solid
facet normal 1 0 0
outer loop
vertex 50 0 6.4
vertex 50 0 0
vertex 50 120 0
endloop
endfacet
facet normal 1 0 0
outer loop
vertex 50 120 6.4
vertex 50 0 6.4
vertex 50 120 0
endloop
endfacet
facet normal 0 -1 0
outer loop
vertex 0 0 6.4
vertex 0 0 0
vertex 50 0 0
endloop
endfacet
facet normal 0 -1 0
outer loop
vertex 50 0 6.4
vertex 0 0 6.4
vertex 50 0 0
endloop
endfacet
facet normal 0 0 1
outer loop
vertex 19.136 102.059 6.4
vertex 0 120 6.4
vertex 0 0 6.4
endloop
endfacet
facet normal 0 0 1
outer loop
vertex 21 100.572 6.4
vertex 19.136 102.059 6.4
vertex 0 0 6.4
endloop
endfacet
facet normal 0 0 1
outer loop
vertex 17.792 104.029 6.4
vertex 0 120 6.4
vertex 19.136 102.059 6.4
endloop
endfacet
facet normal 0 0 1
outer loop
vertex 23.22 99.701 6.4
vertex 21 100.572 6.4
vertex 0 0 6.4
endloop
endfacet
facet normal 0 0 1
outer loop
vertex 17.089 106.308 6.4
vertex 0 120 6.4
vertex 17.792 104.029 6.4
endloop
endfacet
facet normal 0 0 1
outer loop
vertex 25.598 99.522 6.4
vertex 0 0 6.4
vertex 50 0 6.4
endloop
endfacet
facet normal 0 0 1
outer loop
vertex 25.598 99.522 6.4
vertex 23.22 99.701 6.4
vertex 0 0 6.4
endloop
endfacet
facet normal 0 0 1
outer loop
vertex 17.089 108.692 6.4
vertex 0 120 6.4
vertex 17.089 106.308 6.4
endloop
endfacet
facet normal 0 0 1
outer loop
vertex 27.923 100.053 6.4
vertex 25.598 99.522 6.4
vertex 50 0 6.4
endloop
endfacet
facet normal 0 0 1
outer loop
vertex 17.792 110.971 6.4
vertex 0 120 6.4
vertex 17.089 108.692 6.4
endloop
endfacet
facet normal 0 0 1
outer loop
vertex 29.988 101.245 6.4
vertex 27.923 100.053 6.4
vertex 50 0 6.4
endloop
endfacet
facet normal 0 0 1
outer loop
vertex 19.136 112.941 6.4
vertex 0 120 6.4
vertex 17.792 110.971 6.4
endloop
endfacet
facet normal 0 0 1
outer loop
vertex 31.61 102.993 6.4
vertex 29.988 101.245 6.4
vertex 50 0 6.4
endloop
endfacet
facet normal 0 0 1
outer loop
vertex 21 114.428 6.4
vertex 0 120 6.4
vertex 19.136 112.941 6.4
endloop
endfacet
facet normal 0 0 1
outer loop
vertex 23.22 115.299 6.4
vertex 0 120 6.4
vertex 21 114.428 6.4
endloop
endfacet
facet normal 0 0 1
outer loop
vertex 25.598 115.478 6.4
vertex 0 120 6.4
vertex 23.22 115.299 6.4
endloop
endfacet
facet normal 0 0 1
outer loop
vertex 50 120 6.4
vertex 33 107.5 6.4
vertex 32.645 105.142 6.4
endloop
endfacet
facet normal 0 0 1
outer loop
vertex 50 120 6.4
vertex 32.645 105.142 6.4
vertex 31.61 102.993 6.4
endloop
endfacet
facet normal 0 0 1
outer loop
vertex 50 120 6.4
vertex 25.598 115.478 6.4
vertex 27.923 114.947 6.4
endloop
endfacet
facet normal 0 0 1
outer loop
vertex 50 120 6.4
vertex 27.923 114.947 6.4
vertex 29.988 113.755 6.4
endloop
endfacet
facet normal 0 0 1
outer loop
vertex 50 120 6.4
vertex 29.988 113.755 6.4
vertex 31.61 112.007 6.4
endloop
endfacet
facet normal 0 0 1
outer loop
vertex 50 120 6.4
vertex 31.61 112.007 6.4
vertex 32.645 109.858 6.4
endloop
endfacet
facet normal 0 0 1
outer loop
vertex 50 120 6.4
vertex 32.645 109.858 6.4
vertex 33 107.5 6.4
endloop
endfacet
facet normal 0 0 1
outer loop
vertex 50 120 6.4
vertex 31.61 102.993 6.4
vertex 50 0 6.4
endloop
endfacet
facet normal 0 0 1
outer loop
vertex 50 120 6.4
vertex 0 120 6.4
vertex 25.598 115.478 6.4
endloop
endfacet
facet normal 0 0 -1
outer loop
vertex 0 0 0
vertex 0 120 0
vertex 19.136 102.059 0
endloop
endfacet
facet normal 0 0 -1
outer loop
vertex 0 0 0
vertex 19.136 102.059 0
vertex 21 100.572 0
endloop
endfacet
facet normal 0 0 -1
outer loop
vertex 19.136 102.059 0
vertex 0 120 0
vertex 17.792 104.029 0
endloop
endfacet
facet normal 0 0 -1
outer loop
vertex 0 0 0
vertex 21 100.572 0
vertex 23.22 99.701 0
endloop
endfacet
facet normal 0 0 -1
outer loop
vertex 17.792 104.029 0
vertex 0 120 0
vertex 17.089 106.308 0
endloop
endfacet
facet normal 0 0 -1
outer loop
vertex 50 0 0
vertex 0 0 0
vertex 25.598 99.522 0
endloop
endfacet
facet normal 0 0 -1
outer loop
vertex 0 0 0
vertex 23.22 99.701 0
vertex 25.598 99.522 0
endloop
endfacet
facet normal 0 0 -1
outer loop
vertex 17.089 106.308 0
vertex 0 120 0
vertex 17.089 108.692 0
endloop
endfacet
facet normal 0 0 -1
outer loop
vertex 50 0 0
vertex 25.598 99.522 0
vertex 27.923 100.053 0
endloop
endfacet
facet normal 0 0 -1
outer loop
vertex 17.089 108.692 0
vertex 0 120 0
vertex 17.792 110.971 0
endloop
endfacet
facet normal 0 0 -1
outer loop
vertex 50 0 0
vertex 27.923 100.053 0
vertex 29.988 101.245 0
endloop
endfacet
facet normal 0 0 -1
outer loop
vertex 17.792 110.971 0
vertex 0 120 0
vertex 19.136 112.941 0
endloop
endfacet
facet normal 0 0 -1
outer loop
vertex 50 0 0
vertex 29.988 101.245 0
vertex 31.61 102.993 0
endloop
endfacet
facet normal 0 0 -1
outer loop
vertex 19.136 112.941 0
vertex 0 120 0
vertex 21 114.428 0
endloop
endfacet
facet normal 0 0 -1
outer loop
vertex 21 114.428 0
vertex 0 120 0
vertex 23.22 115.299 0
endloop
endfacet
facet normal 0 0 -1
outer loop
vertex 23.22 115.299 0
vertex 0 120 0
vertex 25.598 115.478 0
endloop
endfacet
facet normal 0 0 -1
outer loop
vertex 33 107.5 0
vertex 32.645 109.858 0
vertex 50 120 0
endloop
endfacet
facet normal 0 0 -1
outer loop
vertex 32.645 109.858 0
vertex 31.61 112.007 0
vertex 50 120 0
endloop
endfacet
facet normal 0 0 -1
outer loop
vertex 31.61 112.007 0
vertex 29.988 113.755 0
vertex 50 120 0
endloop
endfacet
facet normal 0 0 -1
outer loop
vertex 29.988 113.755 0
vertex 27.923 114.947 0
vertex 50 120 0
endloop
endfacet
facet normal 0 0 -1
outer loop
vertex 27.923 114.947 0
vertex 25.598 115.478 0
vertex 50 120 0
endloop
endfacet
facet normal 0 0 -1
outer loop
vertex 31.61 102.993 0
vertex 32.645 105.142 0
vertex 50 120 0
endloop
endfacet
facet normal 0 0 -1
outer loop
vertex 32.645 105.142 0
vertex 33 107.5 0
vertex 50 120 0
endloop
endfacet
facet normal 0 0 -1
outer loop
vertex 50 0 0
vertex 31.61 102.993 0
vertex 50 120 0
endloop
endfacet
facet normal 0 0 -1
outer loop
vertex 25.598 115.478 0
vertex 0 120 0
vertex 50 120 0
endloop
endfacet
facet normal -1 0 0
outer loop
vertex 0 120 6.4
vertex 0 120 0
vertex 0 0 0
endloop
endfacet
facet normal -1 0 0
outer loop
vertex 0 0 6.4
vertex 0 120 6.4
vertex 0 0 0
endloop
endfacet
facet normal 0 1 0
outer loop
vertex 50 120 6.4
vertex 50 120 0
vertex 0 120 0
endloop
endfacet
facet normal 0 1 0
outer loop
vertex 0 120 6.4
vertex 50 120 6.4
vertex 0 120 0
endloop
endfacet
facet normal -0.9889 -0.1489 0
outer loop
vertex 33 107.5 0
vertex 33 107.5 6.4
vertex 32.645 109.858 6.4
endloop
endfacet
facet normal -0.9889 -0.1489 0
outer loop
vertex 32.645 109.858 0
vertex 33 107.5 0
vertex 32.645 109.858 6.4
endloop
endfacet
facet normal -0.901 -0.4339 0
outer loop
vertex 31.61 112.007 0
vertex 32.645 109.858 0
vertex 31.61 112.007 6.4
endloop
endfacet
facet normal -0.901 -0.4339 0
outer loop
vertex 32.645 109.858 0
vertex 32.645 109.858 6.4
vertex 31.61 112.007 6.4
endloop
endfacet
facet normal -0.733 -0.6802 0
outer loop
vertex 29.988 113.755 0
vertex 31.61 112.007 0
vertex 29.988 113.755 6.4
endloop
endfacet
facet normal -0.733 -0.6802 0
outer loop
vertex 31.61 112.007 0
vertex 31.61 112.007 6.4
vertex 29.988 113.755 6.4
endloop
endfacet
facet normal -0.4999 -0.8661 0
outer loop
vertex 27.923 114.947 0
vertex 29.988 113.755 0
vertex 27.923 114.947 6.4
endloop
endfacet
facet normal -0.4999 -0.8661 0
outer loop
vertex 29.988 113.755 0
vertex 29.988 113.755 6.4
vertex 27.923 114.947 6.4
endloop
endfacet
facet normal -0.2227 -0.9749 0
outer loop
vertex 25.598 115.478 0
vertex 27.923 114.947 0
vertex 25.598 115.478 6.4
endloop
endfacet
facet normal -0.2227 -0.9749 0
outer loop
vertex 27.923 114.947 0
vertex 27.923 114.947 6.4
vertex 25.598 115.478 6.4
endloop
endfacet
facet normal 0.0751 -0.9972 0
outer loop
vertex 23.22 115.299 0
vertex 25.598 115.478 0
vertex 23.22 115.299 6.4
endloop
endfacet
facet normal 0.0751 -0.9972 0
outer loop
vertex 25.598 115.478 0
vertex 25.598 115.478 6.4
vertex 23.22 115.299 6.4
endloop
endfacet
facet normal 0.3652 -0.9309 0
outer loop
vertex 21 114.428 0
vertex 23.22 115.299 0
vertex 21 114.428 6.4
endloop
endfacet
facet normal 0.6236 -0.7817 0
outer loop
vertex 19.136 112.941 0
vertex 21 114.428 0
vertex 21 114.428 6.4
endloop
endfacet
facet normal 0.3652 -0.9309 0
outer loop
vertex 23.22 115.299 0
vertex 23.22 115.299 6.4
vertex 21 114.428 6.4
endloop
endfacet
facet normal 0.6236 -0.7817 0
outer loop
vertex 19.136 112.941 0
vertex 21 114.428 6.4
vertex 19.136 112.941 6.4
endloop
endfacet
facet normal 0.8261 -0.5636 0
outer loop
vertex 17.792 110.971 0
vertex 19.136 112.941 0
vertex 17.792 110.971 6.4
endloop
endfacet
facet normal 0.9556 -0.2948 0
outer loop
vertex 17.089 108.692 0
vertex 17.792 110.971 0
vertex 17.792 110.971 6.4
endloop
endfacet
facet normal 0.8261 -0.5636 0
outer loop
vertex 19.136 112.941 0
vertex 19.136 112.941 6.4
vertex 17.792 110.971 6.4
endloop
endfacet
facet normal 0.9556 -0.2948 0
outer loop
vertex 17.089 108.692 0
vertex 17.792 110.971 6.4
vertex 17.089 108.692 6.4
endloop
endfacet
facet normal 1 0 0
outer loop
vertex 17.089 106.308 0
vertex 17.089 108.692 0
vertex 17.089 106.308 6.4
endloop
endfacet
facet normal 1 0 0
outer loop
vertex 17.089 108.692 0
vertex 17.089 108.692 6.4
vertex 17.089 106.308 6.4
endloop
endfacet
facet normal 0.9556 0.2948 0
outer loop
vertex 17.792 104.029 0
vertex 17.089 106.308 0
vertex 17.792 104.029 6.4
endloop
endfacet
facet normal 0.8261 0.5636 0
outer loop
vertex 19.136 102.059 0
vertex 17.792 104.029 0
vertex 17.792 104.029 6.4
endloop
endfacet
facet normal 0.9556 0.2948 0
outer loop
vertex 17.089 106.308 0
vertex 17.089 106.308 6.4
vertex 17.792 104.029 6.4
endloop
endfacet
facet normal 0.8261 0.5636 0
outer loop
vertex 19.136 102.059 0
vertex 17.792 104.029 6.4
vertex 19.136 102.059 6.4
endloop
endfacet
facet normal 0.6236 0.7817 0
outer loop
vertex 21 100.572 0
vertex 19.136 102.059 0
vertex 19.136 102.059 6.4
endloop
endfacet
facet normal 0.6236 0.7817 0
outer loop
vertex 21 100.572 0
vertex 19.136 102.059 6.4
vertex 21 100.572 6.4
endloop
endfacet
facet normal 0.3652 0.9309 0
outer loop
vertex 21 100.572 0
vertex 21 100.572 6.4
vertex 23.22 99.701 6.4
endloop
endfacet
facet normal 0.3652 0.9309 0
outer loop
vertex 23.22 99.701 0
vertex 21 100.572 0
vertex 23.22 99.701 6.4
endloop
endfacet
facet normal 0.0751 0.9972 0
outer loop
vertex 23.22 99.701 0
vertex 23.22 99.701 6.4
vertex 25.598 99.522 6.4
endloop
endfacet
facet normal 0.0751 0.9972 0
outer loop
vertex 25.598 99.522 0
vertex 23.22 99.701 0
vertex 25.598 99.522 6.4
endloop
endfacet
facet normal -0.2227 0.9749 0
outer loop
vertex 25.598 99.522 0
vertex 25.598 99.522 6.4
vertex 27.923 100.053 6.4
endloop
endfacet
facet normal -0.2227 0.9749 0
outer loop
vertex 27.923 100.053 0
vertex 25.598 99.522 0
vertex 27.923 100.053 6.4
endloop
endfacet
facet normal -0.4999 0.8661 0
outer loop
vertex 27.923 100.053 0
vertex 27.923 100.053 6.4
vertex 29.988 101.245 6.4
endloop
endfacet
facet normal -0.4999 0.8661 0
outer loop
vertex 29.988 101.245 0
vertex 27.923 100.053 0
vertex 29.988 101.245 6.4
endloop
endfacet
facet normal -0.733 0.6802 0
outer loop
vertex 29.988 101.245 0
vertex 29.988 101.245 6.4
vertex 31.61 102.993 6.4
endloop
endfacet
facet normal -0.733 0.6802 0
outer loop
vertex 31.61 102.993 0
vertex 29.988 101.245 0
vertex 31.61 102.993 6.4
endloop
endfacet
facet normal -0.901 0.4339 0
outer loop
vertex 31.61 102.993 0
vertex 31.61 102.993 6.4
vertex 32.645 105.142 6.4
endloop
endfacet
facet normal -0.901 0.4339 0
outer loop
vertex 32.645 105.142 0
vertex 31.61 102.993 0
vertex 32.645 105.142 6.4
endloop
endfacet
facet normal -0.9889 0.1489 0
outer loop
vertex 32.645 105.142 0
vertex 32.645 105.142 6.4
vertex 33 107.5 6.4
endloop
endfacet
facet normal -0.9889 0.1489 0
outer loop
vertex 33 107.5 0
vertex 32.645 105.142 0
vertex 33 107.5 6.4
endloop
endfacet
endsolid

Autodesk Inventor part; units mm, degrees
ref_plane "YZ Plane" through (0, 0, 0) normal (1, 0, 0) x (0, 1, 0)
ref_plane "XZ Plane" through (0, 0, 0) normal (0, 1, 0) x (-1, 0, 0)
ref_plane "XY Plane" through (0, 0, 0) normal (0, 0, 1) x (1, 0, 0)
sketch "Boceto1" plane through (0, 0, 0) normal (0, 0, 1) x (1, 0, 0)
  line L0 (0, 0) -> (50, 0)
  line L1 (50, 0) -> (50, 120)
  line L2 (50, 120) -> (0, 120)
  line L3 (0, 120) -> (0, 0)
  dimension "d0" = 50
  dimension "d1" = 120
extrude "Extrusión1" add sketch "Boceto1" along normal blind 6.4
sketch "Boceto2" plane through (0, 0, 6.4) normal (0, 0, 1) x (1, 0, 0)
  line L0 (50, 120) -> (0, 120) projected
  line L1 (25, 120) -> (25, 117)
  line L2 (25, 117) -> (25, 107.5)
  circle A0 centre (25, 107.5) radius 8
  point P0 (0, 0)
  dimension "d4" = 3
  dimension "d5" = 9.5
  dimension "d6" = 16
extrude "Extrusión2" cut sketch "Boceto2" against normal through all
properties part number "Base_cortadora"
